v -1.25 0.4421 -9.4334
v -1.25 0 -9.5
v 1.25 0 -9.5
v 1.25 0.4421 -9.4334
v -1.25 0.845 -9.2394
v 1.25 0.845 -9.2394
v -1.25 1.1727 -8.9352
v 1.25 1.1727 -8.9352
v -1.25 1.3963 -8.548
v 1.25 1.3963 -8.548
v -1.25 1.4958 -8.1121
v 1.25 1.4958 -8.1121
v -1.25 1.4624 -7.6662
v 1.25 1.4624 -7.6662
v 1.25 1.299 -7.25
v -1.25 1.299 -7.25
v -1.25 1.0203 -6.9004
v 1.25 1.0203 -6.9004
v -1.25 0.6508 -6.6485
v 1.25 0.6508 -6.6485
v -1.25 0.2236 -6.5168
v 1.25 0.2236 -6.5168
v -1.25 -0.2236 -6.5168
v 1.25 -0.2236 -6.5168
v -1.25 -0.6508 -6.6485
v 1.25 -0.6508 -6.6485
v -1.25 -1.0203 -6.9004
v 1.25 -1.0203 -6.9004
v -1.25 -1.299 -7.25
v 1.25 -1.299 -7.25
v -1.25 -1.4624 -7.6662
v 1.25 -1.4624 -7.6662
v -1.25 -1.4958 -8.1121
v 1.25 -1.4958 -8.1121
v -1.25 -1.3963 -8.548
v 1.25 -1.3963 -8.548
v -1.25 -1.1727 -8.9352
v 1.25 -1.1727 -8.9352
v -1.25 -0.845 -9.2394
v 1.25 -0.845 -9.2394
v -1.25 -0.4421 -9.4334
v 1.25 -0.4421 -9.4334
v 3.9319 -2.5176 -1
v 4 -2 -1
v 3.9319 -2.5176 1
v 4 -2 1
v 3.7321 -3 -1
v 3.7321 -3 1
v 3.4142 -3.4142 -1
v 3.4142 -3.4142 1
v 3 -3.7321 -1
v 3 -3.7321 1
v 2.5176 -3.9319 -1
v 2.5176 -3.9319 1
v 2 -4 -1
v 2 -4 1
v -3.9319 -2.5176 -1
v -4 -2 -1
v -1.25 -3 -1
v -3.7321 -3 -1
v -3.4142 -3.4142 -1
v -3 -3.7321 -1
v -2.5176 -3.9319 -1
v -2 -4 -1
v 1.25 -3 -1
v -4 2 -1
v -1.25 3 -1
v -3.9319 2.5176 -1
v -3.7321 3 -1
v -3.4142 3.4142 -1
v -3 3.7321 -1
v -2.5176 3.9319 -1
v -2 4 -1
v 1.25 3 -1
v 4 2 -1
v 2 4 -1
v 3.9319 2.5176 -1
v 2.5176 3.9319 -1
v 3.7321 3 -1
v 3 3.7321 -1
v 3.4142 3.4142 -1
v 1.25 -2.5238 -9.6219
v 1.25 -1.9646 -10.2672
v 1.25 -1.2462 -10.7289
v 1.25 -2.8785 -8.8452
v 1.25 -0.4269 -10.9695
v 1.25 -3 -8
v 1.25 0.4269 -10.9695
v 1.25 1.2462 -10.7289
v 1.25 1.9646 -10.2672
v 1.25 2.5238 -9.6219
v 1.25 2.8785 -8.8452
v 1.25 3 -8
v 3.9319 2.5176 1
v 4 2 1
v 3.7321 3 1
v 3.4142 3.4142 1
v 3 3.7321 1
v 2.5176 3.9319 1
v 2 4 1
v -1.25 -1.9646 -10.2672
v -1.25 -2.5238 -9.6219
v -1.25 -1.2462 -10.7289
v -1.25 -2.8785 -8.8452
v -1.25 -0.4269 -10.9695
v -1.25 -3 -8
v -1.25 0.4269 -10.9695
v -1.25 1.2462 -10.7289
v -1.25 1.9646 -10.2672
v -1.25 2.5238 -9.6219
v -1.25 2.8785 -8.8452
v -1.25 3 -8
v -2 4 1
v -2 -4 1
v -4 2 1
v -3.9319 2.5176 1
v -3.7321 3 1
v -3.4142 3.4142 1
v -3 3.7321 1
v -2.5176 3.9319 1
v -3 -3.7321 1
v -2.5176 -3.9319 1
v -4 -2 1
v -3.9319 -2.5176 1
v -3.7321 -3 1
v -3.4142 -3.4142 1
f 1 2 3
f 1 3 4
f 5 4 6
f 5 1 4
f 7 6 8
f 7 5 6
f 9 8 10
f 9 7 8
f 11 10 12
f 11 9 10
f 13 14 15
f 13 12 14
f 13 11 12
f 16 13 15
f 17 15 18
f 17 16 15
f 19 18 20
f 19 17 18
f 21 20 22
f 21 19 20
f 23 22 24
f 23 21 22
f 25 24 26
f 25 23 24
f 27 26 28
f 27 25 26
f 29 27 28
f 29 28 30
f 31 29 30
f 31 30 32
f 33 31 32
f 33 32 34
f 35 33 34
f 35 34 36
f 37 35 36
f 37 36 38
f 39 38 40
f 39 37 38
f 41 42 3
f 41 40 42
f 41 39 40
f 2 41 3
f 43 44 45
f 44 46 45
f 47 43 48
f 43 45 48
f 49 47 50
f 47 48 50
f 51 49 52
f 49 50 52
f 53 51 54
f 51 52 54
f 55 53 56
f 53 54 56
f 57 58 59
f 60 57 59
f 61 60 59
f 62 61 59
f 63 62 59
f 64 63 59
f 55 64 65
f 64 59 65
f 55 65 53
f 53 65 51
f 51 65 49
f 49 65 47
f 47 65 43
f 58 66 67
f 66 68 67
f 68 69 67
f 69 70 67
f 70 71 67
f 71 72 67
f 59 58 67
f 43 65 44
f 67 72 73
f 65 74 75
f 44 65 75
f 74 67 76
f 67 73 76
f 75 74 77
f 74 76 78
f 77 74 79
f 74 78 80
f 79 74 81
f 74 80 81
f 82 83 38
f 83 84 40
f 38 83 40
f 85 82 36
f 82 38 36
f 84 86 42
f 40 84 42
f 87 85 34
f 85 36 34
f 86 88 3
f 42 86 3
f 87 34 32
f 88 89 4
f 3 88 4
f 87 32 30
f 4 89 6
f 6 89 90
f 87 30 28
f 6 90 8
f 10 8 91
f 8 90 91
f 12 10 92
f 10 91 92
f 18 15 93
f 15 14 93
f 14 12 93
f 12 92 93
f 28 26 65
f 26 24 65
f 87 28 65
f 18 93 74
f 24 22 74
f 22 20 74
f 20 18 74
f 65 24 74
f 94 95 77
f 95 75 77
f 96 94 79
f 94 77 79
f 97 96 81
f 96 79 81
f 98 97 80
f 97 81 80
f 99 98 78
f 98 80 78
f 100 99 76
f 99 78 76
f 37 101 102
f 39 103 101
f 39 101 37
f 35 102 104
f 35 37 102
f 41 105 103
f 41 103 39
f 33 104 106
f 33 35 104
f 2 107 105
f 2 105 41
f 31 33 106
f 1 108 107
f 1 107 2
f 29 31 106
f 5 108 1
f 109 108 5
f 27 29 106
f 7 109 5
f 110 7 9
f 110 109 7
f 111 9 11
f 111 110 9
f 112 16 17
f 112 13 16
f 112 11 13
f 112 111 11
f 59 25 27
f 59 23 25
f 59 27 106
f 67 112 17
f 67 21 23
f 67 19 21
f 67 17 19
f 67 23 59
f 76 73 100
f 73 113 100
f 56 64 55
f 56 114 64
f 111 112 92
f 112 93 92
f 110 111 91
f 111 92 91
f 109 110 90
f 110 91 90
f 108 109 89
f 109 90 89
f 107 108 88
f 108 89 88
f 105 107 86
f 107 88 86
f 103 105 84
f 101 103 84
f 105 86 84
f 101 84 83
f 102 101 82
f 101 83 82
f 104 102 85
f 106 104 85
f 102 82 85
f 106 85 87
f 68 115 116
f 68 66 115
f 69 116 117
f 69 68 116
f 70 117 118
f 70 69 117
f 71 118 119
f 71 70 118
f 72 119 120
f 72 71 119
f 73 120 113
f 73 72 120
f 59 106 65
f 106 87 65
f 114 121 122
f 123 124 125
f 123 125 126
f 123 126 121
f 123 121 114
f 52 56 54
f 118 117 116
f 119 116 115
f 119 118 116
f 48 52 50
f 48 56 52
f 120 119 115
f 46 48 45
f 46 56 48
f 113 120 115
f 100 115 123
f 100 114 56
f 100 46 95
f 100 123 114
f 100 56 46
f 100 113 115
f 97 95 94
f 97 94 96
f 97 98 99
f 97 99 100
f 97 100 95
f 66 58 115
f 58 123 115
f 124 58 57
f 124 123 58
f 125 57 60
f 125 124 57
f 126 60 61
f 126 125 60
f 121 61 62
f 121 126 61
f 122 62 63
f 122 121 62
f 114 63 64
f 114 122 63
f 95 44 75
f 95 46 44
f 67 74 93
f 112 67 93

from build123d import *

# Parameters (mm, degrees)
SKETCH1_W               = 8
SKETCH1_H               = 8
BOSS_EXTRUDE1_DEPTH     = 1
FILLET1_R               = 2
BOSS_EXTRUDE2_DEPTH     = 1.25
CUT_EXTRUDE1_DEPTH      = 13.369316877
CUT_EXTRUDE1_DEPTH_BACK = 13.369316877
SKETCH3_R               = 1.5


with BuildPart() as part:
    # Sketch1 → Boss-Extrude1 (new, symmetric)
    with BuildSketch(Plane.XY):
        Rectangle(SKETCH1_W, SKETCH1_H)
    extrude(amount=BOSS_EXTRUDE1_DEPTH, both=True)

    # Fillet1
    fillet1_edges = [part.edges().sort_by_distance(p)[0] for p in [
        (-4, 4, 0),
        (4, 4, 0),
        (4, -4, 0),
        (-4, -4, 0),
    ]]
    fillet(fillet1_edges, radius=FILLET1_R)

    # Sketch2 → Boss-Extrude2 (add, symmetric)
    with BuildSketch(Plane(origin=(0, 0, 0), x_dir=(0, 0, -1), z_dir=(1, 0, 0))):
        with BuildLine():
            Line((1, 3), (8, 3))
            ThreePointArc((8, 3), (11, 0), (8, -3))
            Line((8, -3), (1, -3))
            Line((1, -3), (1, 3))
        make_face()
    extrude(amount=BOSS_EXTRUDE2_DEPTH, both=True)

    # Sketch3 → Cut-Extrude1 (cut, two sides: drawn at the far end of the back side and taken through both)
    with BuildSketch(Plane(origin=(0, 0, 0), x_dir=(0, 0, -1), z_dir=(1, 0, 0)).offset(-CUT_EXTRUDE1_DEPTH_BACK)):
        with Locations((8, 0)):
            Circle(SKETCH3_R)
    extrude(amount=CUT_EXTRUDE1_DEPTH + CUT_EXTRUDE1_DEPTH_BACK, mode=Mode.SUBTRACT)


solid = part.part
